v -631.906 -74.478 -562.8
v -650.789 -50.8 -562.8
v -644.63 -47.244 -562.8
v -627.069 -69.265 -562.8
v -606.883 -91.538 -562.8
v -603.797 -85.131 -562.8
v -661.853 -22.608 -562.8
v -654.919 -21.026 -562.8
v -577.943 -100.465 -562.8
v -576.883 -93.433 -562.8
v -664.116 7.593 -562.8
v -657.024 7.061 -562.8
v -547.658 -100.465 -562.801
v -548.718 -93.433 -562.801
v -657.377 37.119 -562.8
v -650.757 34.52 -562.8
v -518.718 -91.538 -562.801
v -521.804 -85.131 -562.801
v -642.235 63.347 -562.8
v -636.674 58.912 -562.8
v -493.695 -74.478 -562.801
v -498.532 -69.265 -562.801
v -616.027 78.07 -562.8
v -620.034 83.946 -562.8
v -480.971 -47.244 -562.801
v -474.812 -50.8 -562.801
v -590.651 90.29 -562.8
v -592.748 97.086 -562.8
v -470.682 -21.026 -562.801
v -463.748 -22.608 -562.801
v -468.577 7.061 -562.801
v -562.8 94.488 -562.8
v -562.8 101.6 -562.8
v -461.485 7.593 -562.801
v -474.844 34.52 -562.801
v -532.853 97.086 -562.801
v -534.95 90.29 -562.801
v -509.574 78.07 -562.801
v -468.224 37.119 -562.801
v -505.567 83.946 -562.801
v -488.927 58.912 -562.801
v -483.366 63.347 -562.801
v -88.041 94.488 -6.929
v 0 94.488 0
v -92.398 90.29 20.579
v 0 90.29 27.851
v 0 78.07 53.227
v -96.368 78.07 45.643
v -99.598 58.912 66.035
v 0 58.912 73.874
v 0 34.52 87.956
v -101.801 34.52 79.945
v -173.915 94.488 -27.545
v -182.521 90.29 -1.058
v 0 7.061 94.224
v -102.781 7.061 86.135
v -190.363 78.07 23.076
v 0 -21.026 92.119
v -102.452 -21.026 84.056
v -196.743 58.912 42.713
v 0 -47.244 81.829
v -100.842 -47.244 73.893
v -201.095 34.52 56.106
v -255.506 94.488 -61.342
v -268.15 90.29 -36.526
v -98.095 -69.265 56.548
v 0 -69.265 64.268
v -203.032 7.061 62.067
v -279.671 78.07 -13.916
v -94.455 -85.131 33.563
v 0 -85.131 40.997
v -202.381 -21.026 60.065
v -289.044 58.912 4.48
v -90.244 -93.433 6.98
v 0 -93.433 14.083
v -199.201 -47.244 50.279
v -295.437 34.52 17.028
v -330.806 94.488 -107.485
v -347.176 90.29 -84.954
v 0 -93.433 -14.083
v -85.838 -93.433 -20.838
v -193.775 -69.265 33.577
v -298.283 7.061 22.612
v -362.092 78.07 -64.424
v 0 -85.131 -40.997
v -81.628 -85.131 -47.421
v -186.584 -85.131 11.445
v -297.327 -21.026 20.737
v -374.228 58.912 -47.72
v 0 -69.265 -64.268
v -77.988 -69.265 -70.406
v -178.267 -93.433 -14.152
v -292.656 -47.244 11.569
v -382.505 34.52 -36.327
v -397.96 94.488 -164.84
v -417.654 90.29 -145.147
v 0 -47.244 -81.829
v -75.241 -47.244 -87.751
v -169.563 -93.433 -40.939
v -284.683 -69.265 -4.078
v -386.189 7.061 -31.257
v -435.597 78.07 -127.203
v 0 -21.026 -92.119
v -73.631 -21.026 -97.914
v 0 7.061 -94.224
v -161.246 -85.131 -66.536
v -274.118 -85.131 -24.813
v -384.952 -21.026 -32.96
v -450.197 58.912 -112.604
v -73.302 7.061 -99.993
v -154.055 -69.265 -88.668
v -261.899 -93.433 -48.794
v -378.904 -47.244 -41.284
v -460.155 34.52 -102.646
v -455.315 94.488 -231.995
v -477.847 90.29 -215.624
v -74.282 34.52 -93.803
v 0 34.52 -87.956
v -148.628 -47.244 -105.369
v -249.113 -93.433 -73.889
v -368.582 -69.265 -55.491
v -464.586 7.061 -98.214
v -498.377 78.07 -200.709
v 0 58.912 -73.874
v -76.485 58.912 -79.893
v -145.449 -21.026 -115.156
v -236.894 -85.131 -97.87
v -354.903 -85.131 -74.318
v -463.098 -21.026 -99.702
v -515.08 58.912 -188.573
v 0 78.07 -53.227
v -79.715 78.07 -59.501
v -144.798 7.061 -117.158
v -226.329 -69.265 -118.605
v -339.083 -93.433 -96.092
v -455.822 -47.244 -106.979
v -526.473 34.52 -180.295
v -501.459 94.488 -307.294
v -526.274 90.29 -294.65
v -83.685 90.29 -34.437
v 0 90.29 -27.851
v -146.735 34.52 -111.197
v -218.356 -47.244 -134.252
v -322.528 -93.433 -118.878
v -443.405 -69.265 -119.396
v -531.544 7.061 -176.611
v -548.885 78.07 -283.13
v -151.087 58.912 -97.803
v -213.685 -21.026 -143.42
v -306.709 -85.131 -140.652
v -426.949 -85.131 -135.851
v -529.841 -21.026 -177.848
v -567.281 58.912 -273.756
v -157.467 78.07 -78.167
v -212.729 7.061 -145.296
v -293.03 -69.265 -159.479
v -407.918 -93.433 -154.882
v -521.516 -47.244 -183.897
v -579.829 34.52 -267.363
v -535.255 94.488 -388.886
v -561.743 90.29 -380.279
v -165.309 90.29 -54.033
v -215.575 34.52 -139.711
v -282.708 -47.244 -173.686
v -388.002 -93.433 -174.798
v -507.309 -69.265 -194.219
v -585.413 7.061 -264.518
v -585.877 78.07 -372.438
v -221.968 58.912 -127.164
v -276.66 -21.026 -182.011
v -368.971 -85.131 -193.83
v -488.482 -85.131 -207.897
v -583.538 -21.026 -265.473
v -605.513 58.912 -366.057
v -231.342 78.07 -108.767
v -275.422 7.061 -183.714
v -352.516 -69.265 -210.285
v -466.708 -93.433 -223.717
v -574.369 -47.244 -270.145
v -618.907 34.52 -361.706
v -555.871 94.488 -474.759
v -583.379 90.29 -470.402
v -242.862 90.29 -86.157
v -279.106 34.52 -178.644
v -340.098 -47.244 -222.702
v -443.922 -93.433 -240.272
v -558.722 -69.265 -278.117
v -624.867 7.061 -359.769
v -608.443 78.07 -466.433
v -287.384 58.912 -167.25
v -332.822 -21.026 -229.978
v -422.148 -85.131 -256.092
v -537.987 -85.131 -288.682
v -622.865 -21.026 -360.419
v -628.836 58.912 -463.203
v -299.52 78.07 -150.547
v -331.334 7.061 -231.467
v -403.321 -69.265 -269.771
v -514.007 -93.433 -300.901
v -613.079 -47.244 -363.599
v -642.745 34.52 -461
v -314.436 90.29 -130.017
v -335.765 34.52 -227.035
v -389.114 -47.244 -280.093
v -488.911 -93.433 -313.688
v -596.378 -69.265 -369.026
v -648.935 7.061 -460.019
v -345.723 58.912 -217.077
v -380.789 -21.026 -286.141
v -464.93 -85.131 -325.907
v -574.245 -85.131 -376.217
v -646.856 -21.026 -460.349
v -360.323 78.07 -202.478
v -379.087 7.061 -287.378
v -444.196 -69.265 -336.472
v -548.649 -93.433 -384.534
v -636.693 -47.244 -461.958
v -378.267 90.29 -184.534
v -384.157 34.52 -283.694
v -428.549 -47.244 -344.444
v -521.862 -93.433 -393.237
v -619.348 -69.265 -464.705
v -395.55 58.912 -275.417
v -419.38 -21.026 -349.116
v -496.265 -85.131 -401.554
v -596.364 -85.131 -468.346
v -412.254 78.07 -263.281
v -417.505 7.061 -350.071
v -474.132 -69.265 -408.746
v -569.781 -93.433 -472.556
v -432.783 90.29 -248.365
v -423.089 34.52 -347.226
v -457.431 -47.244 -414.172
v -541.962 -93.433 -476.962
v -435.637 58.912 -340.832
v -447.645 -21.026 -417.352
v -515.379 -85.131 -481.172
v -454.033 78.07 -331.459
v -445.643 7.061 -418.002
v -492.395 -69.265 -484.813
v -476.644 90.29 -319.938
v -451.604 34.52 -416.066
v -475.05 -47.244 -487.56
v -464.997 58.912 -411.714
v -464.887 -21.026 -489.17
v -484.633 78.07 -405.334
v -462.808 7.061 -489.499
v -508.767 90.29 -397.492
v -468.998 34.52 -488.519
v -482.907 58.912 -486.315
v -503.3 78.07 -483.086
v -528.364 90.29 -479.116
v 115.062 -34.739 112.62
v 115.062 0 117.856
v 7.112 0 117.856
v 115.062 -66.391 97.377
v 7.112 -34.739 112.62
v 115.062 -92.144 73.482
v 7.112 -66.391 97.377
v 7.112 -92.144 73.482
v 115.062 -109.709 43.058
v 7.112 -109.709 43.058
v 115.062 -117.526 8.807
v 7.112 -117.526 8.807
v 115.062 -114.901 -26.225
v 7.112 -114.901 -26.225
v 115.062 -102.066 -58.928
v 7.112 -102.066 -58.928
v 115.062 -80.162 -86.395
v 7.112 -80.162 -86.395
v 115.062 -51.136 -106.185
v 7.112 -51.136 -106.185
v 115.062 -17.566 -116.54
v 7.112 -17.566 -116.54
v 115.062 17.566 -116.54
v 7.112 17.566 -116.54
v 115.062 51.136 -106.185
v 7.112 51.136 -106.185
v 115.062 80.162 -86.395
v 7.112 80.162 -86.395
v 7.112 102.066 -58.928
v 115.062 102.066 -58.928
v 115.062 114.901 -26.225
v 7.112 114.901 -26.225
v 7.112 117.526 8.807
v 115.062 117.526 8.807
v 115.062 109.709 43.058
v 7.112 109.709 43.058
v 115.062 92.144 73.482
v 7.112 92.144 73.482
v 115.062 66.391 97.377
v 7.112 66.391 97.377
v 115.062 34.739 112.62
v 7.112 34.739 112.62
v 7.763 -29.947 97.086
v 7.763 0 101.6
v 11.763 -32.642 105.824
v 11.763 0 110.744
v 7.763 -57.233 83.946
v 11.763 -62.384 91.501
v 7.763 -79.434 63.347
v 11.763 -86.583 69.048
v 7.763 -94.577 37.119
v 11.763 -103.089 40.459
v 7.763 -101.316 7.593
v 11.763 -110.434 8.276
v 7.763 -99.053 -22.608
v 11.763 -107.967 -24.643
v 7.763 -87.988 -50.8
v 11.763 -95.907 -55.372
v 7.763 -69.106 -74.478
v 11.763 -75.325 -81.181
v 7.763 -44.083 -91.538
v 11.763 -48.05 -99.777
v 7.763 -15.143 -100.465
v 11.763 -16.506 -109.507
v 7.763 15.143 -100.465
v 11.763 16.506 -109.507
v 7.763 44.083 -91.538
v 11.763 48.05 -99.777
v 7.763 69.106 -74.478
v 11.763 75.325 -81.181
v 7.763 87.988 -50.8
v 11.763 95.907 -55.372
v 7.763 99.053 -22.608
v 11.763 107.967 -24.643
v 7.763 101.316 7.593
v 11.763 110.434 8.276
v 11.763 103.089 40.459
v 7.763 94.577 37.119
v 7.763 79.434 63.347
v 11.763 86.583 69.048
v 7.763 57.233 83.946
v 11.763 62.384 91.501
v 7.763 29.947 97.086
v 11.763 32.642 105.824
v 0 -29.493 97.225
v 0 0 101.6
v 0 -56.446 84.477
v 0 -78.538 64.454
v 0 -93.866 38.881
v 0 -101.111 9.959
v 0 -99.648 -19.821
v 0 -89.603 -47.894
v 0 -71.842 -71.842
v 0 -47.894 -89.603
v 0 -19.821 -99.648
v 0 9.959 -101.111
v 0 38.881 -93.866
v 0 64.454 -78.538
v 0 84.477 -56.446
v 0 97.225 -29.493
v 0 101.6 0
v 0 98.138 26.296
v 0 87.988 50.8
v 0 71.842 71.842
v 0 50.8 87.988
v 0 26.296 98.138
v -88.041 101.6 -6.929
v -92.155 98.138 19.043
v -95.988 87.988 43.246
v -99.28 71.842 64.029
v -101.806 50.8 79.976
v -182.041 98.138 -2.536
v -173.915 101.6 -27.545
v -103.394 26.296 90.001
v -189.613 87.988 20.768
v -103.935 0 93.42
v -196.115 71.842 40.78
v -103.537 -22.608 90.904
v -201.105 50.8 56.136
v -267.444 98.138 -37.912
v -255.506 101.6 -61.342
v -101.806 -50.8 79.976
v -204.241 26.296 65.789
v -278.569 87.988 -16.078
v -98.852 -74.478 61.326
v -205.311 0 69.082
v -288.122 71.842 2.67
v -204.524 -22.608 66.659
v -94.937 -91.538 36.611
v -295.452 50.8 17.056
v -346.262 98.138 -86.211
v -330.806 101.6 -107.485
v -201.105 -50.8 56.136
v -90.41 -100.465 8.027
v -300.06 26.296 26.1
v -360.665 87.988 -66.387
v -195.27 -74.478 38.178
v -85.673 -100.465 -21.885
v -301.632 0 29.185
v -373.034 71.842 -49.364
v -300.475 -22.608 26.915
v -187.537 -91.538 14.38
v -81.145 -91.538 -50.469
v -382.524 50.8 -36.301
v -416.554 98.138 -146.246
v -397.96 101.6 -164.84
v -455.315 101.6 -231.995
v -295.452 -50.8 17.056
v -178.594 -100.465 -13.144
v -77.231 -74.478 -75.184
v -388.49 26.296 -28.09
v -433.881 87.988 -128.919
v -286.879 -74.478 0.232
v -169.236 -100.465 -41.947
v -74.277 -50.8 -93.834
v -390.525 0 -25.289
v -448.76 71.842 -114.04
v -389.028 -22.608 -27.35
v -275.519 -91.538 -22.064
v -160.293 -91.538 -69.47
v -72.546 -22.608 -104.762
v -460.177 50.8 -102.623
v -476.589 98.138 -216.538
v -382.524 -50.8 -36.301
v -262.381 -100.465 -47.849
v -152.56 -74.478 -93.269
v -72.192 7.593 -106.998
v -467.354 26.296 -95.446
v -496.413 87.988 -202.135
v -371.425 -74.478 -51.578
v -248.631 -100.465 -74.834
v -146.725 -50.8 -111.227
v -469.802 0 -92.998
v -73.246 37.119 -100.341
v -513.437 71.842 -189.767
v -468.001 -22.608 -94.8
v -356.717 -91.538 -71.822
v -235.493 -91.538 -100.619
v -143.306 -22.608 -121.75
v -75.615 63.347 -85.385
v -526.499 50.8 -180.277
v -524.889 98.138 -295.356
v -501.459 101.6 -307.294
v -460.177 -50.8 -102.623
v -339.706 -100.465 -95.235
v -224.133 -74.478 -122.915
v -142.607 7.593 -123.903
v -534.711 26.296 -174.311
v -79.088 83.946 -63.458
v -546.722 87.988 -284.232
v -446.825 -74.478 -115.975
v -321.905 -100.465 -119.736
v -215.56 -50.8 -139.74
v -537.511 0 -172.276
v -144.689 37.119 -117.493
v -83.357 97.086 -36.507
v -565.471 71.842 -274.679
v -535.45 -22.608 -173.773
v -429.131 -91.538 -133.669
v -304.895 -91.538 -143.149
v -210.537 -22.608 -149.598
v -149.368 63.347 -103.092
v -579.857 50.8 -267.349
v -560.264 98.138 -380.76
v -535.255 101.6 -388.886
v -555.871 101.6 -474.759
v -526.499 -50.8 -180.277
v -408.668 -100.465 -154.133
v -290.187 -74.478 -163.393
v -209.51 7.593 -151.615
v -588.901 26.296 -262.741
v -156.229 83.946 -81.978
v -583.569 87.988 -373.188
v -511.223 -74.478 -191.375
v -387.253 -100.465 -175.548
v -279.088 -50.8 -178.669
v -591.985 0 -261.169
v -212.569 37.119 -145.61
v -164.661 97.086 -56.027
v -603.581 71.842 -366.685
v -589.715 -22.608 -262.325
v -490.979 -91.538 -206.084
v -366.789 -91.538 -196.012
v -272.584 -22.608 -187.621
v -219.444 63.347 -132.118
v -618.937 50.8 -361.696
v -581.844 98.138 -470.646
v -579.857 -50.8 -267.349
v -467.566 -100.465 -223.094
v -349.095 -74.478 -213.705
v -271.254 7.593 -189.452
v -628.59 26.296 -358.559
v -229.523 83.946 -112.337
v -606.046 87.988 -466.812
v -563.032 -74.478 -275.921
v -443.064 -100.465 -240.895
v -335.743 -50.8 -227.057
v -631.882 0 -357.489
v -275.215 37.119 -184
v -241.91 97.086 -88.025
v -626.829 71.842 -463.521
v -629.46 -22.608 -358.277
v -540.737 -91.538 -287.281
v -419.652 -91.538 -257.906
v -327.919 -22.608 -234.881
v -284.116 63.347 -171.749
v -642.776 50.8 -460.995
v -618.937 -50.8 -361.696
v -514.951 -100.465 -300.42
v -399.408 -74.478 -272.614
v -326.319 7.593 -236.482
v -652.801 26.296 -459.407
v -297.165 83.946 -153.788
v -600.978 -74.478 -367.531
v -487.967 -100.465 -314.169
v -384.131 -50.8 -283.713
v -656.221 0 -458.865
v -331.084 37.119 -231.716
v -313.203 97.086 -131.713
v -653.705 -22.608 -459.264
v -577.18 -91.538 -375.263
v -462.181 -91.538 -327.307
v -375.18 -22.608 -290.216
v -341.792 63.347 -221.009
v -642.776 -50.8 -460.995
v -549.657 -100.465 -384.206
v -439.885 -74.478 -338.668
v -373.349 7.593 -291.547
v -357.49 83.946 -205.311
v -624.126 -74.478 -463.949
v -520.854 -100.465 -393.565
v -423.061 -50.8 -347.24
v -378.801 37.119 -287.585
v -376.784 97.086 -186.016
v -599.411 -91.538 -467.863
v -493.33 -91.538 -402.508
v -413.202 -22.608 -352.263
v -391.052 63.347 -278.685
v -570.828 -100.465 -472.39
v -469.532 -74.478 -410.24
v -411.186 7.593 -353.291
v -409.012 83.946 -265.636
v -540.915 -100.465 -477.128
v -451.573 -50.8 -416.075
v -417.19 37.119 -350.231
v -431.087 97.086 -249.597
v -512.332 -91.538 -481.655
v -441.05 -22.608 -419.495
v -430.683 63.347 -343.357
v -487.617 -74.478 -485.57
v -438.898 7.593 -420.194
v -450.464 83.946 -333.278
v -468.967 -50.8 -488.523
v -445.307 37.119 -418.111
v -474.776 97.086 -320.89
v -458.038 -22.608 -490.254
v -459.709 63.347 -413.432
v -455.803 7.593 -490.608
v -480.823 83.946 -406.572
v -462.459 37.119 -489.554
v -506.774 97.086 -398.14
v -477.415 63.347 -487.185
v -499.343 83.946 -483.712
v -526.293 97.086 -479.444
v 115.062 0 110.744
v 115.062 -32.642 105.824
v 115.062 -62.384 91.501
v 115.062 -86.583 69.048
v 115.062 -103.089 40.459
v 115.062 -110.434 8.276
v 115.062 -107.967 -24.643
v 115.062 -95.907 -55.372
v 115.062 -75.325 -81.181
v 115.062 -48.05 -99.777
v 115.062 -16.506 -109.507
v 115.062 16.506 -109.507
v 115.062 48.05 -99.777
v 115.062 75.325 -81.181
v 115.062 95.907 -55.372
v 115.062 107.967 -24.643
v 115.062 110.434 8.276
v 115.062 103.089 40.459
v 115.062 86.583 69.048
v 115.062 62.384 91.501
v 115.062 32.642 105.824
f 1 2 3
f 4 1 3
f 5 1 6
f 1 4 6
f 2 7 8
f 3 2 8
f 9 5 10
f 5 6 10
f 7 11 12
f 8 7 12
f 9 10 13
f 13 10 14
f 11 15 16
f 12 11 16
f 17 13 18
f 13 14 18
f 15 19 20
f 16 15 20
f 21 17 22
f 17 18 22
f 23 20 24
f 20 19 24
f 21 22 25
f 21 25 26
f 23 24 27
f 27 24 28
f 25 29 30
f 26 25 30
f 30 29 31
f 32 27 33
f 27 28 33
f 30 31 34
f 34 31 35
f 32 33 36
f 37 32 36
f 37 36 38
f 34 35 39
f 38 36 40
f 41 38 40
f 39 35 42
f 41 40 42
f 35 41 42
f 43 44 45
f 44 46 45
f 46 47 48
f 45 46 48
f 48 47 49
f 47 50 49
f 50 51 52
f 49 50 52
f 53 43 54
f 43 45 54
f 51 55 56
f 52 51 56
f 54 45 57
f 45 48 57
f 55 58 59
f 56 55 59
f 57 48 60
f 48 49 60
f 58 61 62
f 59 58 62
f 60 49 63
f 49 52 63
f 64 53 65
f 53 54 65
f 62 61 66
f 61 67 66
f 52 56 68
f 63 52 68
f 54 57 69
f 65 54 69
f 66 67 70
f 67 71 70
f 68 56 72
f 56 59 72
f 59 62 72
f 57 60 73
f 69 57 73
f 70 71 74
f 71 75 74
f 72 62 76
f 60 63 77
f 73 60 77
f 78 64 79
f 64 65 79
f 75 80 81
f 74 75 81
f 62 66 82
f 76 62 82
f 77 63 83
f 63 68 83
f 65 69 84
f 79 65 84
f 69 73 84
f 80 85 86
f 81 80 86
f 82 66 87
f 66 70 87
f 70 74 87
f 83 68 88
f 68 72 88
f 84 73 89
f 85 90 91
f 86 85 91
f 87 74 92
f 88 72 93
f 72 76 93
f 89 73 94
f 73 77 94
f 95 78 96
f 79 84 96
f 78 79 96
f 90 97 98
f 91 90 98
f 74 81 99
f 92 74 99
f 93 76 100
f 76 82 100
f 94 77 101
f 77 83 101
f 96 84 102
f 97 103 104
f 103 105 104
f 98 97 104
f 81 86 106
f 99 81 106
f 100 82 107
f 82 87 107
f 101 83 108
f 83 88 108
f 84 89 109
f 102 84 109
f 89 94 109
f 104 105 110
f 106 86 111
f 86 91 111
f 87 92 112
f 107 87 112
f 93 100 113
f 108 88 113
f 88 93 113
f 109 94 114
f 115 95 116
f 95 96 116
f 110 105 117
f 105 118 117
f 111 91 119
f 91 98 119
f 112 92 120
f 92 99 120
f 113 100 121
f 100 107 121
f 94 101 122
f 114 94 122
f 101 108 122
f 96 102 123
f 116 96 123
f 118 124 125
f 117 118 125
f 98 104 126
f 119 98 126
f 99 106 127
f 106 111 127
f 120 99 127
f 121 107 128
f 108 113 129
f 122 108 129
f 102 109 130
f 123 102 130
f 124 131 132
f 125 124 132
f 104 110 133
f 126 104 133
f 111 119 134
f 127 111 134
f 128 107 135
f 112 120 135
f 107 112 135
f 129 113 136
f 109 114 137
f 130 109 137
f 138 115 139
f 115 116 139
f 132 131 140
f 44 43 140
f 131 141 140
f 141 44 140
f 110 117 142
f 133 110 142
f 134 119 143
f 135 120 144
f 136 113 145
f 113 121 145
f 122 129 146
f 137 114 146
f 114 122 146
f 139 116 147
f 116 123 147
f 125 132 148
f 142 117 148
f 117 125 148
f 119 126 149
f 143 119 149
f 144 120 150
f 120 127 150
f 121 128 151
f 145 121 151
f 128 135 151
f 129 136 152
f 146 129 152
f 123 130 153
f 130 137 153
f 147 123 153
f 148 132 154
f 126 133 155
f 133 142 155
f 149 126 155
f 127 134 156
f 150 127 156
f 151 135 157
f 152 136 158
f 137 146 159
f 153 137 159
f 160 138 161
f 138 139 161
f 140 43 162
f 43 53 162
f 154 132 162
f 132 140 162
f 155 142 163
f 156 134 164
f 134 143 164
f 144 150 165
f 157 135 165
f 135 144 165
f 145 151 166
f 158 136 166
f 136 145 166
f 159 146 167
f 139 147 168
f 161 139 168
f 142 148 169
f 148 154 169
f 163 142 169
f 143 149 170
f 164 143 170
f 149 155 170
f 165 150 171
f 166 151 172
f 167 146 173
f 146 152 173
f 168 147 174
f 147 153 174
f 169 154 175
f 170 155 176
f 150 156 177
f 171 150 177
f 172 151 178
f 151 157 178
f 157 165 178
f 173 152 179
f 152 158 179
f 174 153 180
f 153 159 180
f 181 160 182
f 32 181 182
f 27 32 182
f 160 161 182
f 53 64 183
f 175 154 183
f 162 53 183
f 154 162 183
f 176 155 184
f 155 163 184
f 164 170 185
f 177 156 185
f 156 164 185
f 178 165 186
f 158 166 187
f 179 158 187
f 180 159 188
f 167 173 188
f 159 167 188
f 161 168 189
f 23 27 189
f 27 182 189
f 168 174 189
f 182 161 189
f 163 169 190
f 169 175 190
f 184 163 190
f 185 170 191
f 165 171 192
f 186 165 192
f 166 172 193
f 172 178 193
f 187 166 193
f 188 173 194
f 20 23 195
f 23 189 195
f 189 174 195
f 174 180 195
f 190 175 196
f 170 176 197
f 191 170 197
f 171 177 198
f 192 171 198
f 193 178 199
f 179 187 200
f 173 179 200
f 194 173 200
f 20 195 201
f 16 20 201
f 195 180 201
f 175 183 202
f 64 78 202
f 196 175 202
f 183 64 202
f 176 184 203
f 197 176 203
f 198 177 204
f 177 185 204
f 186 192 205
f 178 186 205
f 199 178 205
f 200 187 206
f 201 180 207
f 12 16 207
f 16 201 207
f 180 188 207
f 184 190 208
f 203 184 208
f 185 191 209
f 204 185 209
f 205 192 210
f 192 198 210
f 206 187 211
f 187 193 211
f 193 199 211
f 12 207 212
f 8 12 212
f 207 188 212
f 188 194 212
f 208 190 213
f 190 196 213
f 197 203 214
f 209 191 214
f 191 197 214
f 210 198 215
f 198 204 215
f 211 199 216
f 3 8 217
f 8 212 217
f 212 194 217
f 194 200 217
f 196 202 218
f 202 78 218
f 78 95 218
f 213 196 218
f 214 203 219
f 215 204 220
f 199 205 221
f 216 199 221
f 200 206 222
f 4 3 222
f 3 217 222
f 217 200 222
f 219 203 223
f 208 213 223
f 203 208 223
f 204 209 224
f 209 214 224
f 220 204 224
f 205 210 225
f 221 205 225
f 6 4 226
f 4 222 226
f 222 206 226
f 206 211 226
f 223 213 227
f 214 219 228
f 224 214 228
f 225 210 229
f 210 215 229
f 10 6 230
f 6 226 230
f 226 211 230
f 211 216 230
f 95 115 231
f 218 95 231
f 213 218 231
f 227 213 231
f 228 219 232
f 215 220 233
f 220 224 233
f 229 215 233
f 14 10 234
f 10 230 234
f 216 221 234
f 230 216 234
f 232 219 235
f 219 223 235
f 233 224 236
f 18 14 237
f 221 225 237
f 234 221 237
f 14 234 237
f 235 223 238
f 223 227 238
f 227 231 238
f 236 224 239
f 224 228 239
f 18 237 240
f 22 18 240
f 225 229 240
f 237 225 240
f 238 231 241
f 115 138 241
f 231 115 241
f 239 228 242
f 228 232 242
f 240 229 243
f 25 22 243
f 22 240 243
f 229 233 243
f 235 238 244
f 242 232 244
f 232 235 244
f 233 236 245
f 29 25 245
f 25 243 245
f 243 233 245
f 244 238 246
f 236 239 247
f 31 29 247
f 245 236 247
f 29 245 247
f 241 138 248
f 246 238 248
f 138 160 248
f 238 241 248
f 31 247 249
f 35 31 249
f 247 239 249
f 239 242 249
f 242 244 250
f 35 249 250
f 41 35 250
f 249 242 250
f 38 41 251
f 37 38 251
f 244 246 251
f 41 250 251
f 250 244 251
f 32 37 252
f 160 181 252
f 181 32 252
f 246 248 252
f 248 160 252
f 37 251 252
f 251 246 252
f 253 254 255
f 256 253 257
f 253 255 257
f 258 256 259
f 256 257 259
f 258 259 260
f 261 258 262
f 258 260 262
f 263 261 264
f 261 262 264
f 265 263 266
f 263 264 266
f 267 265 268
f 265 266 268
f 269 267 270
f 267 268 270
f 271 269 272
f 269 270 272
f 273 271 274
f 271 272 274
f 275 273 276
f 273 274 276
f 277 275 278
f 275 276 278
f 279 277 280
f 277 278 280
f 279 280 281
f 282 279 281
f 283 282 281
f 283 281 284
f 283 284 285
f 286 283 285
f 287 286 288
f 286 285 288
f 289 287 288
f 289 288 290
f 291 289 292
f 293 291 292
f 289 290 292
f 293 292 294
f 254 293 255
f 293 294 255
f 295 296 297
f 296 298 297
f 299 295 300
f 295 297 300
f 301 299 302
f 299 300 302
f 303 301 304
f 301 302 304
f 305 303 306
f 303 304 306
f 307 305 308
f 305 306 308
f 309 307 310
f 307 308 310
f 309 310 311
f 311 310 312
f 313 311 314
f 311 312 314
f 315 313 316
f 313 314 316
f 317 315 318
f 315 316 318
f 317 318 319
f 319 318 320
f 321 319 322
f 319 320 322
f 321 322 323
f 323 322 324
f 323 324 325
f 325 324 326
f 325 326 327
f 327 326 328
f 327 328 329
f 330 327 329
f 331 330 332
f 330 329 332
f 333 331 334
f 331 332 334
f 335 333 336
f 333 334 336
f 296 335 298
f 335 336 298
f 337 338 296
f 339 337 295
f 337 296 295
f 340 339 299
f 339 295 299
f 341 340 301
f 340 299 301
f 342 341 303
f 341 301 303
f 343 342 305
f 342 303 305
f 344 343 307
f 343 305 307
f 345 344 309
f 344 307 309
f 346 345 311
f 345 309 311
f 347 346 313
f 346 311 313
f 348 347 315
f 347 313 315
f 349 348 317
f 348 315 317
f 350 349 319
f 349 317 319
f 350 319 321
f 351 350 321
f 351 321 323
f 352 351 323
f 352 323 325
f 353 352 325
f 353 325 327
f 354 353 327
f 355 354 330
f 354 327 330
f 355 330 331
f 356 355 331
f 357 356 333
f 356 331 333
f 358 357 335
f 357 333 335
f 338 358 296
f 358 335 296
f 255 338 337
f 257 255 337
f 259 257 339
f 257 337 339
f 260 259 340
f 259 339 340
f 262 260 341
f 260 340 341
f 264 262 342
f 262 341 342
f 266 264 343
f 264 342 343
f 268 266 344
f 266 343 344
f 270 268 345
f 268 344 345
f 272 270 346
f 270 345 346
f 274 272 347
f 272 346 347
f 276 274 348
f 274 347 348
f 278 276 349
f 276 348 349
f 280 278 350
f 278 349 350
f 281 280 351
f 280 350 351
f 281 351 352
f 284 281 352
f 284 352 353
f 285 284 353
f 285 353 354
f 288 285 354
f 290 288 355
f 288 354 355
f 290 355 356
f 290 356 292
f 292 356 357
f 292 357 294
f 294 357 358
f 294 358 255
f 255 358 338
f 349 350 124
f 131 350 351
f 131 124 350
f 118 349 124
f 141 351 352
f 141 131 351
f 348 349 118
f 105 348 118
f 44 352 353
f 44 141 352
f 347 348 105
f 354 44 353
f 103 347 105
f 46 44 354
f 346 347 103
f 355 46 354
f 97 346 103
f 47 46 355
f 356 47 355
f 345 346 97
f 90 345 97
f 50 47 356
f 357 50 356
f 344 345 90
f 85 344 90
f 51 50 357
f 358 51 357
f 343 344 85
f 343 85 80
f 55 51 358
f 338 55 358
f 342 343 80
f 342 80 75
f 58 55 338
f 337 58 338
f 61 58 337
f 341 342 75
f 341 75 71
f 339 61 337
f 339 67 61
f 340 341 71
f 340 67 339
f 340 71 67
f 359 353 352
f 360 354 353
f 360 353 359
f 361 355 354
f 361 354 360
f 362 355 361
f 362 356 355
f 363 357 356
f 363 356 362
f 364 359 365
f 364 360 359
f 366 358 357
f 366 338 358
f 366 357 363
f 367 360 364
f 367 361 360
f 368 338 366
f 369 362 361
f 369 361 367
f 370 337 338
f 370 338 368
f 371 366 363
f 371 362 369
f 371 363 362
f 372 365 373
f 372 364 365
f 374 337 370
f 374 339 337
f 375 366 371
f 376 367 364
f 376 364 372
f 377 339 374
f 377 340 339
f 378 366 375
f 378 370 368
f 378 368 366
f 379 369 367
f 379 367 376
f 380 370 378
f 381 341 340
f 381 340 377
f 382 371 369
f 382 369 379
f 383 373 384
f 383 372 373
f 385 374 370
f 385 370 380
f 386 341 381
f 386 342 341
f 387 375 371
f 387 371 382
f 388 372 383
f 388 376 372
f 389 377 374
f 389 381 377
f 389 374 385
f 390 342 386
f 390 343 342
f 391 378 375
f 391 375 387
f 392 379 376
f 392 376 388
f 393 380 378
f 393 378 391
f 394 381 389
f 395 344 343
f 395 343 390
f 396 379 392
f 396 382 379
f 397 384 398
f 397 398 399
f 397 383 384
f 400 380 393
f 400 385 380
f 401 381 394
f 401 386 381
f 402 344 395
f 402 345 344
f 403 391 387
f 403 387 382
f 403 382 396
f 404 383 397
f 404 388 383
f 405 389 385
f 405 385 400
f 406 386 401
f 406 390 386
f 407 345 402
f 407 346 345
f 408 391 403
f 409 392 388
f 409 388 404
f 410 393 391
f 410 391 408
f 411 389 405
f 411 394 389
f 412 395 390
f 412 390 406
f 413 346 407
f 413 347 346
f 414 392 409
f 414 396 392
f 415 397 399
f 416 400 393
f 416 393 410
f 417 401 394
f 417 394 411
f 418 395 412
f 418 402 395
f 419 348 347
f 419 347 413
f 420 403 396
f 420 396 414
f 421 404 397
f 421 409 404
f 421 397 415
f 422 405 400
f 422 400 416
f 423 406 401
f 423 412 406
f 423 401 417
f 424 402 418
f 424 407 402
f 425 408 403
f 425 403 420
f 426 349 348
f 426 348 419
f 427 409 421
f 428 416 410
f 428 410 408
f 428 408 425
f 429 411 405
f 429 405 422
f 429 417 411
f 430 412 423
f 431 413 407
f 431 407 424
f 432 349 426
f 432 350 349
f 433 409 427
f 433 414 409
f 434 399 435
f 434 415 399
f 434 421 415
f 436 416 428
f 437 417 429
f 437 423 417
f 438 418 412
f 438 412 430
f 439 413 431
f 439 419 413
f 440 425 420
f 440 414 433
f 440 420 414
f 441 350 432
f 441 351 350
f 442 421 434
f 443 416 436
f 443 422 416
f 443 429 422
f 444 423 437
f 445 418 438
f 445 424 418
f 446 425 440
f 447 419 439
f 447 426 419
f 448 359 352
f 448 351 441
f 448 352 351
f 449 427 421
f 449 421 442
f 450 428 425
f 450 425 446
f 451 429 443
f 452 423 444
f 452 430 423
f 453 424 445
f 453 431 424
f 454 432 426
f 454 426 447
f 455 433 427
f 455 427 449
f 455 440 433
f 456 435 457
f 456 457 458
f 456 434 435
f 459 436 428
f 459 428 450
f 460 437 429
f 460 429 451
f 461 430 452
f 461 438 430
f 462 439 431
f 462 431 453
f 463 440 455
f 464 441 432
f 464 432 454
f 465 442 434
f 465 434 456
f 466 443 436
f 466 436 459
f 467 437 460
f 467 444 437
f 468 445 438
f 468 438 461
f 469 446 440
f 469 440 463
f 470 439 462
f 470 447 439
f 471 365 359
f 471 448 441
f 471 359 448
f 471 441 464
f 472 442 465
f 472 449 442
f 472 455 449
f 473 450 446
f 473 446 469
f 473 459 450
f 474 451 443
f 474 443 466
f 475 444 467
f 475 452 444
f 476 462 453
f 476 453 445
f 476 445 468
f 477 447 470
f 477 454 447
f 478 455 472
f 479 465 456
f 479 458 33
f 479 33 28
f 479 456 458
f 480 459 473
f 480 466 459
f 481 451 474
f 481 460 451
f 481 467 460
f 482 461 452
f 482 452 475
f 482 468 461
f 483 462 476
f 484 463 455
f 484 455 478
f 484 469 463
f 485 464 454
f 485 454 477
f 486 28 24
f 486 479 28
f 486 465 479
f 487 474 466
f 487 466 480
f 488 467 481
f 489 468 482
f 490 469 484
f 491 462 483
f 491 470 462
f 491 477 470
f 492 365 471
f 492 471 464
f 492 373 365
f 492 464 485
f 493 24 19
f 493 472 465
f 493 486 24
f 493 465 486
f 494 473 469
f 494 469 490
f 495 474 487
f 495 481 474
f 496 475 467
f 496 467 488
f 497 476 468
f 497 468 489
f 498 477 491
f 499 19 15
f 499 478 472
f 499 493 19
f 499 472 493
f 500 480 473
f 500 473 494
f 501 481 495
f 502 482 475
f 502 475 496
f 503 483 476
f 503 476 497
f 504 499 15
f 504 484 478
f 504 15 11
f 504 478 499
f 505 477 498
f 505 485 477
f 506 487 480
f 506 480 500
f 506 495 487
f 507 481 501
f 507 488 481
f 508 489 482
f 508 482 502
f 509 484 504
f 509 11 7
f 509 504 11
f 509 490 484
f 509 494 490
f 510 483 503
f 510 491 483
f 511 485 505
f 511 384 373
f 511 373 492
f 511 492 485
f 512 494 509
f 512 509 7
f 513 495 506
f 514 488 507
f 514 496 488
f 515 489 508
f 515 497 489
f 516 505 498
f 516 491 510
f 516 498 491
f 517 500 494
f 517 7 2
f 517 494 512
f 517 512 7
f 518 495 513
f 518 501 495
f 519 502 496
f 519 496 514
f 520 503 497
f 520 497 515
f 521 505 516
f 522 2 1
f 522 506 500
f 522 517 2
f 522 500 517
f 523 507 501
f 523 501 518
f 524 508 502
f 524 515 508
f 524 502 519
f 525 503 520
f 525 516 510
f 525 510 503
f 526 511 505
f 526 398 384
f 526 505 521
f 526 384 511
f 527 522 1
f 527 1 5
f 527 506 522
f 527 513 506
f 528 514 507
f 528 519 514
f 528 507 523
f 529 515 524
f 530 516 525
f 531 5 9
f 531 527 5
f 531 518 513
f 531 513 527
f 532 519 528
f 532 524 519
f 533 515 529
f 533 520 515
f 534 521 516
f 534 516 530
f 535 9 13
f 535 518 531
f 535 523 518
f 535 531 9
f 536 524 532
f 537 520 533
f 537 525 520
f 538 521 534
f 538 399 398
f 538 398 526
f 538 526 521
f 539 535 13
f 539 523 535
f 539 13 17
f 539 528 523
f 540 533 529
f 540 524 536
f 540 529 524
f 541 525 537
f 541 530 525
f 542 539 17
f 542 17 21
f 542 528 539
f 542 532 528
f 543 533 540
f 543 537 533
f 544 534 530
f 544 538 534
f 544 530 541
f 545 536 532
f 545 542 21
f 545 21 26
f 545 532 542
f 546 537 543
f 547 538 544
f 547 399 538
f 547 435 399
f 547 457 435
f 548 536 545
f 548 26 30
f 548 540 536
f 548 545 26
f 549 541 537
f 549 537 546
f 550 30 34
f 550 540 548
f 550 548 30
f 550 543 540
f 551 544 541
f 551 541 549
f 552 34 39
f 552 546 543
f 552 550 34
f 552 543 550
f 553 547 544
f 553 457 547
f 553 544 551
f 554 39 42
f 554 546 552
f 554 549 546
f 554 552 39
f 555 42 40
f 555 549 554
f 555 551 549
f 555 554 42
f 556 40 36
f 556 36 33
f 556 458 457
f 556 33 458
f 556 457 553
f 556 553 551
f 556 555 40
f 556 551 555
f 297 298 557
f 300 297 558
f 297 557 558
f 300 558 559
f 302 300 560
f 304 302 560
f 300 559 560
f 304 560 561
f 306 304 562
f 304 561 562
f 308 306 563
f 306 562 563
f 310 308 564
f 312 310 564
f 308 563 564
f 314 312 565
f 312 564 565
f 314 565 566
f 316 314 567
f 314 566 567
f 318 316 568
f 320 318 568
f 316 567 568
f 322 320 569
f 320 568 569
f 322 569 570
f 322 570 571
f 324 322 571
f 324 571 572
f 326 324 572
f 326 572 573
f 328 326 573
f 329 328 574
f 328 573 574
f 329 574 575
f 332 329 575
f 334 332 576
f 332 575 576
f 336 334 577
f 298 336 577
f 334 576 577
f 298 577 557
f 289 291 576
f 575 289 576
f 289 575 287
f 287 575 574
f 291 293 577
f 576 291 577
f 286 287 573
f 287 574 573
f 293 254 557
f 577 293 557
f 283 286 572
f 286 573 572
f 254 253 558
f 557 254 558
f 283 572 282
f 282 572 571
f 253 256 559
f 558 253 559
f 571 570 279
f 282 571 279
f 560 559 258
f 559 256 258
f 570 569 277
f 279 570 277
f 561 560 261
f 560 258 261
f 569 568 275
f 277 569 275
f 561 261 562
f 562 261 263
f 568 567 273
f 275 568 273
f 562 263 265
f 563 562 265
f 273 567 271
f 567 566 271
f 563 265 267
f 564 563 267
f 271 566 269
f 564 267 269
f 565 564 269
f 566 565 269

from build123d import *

# Parameters (mm, degrees)
F1_R   = 101.6
F1_R_2 = 94.488


with BuildPart() as f2:
    # F0 (on Front) → F2 (revolve)
    with BuildSketch(Plane.XZ):
        Polygon((7.112, 117.856), (0, 101.6), (7.762859, 101.6), (11.763359, 110.744), (115.062, 110.744), (115.062, 117.856), align=None)
    revolve(axis=Axis((57.531, 0, 0), (1, 0, 0)))

    # F4: sweep along a path in F3
    with BuildLine(Plane.XZ) as f4_path:
        ThreePointArc((0, 0), (-397.96005, -164.84045), (-562.8005, -562.8005))
    # F1 (on Right) → F4 (sweep)
    with BuildSketch(Plane.YZ):
        Circle(F1_R)
        Circle(F1_R_2, mode=Mode.SUBTRACT)
    sweep(path=f4_path.line)


solid = f2.part
